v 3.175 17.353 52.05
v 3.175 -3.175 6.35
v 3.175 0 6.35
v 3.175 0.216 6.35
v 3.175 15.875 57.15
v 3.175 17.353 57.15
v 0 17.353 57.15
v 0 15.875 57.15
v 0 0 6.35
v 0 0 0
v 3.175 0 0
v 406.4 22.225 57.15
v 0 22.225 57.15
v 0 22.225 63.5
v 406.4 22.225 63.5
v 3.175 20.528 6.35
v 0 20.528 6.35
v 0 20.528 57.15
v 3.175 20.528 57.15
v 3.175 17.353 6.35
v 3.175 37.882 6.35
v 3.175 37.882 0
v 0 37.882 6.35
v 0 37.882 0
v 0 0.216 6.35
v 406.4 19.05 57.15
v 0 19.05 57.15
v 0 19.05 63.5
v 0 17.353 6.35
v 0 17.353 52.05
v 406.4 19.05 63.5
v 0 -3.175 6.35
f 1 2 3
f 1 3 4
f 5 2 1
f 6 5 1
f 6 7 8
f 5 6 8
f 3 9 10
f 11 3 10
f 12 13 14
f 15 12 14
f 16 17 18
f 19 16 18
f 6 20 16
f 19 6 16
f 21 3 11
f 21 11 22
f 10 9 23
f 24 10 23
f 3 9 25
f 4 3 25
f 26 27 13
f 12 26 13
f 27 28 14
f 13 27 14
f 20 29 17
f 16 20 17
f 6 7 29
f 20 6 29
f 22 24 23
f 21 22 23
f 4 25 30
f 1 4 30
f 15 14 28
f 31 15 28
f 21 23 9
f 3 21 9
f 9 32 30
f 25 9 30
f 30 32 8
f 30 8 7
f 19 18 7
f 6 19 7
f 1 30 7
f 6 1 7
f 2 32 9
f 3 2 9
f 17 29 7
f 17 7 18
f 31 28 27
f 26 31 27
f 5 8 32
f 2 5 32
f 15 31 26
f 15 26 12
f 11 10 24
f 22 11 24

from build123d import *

# Parameters (mm, degrees)
F1_DEPTH = 406.4
F2_DEPTH = 3.175
F3_DEPTH = 3.175
F4_DEPTH = 3.175


# Not quite as in the source:
# - a feature names something its author has since deleted; it is built from what else it names


with BuildPart() as f1:
    # F0 (on Right) → F1 (new body)
    with BuildSketch(Plane.YZ):
        Polygon((20.52828, 57.15), (22.225, 57.15), (22.225, 63.4995258801), (19.05, 63.4995258801), (19.05, 57.15), align=None)
    extrude(amount=F1_DEPTH)


with BuildPart() as f2:
    # F0 (on Right) → F2 (new body)
    with BuildSketch(Plane.YZ):
        Polygon((-3.175, 6.35), (0, 6.3495258801), (0.2157236914, 6.3495258801), (17.35328, 52.0496760362), (17.35328, 57.15), (15.875, 57.15), align=None)
    extrude(amount=F2_DEPTH)


with BuildPart() as f3:
    # F0 (on Right) → F3 (new body)
    with BuildSketch(Plane.YZ):
        Polygon((0, 6.3495258801), (0, -0.0004741199), (37.88156, -0.0004741199), (37.88156, 6.3495258801), (37.4691675524, 6.3495258801), (20.52828, 6.3495258801), (18.94078, 6.3495258801), (17.35328, 6.3495258801), (0.2157236914, 6.3495258801), align=None)
    extrude(amount=F3_DEPTH)


with BuildPart() as f4:
    # F0 (on Right) → F4 (new body)
    with BuildSketch(Plane.YZ):
        Polygon((17.35328, 52.0496760362), (17.35328, 6.3495258801), (18.94078, 6.3495258801), (20.52828, 6.3495258801), (20.52828, 52.0496760362), align=None)
        Polygon((17.35328, 57.15), (17.35328, 52.0496760362), (20.52828, 52.0496760362), (20.52828, 57.15), (19.05, 57.15), align=None)
    extrude(amount=F4_DEPTH)


solid = Compound([f1.part, f2.part, f3.part, f4.part])
